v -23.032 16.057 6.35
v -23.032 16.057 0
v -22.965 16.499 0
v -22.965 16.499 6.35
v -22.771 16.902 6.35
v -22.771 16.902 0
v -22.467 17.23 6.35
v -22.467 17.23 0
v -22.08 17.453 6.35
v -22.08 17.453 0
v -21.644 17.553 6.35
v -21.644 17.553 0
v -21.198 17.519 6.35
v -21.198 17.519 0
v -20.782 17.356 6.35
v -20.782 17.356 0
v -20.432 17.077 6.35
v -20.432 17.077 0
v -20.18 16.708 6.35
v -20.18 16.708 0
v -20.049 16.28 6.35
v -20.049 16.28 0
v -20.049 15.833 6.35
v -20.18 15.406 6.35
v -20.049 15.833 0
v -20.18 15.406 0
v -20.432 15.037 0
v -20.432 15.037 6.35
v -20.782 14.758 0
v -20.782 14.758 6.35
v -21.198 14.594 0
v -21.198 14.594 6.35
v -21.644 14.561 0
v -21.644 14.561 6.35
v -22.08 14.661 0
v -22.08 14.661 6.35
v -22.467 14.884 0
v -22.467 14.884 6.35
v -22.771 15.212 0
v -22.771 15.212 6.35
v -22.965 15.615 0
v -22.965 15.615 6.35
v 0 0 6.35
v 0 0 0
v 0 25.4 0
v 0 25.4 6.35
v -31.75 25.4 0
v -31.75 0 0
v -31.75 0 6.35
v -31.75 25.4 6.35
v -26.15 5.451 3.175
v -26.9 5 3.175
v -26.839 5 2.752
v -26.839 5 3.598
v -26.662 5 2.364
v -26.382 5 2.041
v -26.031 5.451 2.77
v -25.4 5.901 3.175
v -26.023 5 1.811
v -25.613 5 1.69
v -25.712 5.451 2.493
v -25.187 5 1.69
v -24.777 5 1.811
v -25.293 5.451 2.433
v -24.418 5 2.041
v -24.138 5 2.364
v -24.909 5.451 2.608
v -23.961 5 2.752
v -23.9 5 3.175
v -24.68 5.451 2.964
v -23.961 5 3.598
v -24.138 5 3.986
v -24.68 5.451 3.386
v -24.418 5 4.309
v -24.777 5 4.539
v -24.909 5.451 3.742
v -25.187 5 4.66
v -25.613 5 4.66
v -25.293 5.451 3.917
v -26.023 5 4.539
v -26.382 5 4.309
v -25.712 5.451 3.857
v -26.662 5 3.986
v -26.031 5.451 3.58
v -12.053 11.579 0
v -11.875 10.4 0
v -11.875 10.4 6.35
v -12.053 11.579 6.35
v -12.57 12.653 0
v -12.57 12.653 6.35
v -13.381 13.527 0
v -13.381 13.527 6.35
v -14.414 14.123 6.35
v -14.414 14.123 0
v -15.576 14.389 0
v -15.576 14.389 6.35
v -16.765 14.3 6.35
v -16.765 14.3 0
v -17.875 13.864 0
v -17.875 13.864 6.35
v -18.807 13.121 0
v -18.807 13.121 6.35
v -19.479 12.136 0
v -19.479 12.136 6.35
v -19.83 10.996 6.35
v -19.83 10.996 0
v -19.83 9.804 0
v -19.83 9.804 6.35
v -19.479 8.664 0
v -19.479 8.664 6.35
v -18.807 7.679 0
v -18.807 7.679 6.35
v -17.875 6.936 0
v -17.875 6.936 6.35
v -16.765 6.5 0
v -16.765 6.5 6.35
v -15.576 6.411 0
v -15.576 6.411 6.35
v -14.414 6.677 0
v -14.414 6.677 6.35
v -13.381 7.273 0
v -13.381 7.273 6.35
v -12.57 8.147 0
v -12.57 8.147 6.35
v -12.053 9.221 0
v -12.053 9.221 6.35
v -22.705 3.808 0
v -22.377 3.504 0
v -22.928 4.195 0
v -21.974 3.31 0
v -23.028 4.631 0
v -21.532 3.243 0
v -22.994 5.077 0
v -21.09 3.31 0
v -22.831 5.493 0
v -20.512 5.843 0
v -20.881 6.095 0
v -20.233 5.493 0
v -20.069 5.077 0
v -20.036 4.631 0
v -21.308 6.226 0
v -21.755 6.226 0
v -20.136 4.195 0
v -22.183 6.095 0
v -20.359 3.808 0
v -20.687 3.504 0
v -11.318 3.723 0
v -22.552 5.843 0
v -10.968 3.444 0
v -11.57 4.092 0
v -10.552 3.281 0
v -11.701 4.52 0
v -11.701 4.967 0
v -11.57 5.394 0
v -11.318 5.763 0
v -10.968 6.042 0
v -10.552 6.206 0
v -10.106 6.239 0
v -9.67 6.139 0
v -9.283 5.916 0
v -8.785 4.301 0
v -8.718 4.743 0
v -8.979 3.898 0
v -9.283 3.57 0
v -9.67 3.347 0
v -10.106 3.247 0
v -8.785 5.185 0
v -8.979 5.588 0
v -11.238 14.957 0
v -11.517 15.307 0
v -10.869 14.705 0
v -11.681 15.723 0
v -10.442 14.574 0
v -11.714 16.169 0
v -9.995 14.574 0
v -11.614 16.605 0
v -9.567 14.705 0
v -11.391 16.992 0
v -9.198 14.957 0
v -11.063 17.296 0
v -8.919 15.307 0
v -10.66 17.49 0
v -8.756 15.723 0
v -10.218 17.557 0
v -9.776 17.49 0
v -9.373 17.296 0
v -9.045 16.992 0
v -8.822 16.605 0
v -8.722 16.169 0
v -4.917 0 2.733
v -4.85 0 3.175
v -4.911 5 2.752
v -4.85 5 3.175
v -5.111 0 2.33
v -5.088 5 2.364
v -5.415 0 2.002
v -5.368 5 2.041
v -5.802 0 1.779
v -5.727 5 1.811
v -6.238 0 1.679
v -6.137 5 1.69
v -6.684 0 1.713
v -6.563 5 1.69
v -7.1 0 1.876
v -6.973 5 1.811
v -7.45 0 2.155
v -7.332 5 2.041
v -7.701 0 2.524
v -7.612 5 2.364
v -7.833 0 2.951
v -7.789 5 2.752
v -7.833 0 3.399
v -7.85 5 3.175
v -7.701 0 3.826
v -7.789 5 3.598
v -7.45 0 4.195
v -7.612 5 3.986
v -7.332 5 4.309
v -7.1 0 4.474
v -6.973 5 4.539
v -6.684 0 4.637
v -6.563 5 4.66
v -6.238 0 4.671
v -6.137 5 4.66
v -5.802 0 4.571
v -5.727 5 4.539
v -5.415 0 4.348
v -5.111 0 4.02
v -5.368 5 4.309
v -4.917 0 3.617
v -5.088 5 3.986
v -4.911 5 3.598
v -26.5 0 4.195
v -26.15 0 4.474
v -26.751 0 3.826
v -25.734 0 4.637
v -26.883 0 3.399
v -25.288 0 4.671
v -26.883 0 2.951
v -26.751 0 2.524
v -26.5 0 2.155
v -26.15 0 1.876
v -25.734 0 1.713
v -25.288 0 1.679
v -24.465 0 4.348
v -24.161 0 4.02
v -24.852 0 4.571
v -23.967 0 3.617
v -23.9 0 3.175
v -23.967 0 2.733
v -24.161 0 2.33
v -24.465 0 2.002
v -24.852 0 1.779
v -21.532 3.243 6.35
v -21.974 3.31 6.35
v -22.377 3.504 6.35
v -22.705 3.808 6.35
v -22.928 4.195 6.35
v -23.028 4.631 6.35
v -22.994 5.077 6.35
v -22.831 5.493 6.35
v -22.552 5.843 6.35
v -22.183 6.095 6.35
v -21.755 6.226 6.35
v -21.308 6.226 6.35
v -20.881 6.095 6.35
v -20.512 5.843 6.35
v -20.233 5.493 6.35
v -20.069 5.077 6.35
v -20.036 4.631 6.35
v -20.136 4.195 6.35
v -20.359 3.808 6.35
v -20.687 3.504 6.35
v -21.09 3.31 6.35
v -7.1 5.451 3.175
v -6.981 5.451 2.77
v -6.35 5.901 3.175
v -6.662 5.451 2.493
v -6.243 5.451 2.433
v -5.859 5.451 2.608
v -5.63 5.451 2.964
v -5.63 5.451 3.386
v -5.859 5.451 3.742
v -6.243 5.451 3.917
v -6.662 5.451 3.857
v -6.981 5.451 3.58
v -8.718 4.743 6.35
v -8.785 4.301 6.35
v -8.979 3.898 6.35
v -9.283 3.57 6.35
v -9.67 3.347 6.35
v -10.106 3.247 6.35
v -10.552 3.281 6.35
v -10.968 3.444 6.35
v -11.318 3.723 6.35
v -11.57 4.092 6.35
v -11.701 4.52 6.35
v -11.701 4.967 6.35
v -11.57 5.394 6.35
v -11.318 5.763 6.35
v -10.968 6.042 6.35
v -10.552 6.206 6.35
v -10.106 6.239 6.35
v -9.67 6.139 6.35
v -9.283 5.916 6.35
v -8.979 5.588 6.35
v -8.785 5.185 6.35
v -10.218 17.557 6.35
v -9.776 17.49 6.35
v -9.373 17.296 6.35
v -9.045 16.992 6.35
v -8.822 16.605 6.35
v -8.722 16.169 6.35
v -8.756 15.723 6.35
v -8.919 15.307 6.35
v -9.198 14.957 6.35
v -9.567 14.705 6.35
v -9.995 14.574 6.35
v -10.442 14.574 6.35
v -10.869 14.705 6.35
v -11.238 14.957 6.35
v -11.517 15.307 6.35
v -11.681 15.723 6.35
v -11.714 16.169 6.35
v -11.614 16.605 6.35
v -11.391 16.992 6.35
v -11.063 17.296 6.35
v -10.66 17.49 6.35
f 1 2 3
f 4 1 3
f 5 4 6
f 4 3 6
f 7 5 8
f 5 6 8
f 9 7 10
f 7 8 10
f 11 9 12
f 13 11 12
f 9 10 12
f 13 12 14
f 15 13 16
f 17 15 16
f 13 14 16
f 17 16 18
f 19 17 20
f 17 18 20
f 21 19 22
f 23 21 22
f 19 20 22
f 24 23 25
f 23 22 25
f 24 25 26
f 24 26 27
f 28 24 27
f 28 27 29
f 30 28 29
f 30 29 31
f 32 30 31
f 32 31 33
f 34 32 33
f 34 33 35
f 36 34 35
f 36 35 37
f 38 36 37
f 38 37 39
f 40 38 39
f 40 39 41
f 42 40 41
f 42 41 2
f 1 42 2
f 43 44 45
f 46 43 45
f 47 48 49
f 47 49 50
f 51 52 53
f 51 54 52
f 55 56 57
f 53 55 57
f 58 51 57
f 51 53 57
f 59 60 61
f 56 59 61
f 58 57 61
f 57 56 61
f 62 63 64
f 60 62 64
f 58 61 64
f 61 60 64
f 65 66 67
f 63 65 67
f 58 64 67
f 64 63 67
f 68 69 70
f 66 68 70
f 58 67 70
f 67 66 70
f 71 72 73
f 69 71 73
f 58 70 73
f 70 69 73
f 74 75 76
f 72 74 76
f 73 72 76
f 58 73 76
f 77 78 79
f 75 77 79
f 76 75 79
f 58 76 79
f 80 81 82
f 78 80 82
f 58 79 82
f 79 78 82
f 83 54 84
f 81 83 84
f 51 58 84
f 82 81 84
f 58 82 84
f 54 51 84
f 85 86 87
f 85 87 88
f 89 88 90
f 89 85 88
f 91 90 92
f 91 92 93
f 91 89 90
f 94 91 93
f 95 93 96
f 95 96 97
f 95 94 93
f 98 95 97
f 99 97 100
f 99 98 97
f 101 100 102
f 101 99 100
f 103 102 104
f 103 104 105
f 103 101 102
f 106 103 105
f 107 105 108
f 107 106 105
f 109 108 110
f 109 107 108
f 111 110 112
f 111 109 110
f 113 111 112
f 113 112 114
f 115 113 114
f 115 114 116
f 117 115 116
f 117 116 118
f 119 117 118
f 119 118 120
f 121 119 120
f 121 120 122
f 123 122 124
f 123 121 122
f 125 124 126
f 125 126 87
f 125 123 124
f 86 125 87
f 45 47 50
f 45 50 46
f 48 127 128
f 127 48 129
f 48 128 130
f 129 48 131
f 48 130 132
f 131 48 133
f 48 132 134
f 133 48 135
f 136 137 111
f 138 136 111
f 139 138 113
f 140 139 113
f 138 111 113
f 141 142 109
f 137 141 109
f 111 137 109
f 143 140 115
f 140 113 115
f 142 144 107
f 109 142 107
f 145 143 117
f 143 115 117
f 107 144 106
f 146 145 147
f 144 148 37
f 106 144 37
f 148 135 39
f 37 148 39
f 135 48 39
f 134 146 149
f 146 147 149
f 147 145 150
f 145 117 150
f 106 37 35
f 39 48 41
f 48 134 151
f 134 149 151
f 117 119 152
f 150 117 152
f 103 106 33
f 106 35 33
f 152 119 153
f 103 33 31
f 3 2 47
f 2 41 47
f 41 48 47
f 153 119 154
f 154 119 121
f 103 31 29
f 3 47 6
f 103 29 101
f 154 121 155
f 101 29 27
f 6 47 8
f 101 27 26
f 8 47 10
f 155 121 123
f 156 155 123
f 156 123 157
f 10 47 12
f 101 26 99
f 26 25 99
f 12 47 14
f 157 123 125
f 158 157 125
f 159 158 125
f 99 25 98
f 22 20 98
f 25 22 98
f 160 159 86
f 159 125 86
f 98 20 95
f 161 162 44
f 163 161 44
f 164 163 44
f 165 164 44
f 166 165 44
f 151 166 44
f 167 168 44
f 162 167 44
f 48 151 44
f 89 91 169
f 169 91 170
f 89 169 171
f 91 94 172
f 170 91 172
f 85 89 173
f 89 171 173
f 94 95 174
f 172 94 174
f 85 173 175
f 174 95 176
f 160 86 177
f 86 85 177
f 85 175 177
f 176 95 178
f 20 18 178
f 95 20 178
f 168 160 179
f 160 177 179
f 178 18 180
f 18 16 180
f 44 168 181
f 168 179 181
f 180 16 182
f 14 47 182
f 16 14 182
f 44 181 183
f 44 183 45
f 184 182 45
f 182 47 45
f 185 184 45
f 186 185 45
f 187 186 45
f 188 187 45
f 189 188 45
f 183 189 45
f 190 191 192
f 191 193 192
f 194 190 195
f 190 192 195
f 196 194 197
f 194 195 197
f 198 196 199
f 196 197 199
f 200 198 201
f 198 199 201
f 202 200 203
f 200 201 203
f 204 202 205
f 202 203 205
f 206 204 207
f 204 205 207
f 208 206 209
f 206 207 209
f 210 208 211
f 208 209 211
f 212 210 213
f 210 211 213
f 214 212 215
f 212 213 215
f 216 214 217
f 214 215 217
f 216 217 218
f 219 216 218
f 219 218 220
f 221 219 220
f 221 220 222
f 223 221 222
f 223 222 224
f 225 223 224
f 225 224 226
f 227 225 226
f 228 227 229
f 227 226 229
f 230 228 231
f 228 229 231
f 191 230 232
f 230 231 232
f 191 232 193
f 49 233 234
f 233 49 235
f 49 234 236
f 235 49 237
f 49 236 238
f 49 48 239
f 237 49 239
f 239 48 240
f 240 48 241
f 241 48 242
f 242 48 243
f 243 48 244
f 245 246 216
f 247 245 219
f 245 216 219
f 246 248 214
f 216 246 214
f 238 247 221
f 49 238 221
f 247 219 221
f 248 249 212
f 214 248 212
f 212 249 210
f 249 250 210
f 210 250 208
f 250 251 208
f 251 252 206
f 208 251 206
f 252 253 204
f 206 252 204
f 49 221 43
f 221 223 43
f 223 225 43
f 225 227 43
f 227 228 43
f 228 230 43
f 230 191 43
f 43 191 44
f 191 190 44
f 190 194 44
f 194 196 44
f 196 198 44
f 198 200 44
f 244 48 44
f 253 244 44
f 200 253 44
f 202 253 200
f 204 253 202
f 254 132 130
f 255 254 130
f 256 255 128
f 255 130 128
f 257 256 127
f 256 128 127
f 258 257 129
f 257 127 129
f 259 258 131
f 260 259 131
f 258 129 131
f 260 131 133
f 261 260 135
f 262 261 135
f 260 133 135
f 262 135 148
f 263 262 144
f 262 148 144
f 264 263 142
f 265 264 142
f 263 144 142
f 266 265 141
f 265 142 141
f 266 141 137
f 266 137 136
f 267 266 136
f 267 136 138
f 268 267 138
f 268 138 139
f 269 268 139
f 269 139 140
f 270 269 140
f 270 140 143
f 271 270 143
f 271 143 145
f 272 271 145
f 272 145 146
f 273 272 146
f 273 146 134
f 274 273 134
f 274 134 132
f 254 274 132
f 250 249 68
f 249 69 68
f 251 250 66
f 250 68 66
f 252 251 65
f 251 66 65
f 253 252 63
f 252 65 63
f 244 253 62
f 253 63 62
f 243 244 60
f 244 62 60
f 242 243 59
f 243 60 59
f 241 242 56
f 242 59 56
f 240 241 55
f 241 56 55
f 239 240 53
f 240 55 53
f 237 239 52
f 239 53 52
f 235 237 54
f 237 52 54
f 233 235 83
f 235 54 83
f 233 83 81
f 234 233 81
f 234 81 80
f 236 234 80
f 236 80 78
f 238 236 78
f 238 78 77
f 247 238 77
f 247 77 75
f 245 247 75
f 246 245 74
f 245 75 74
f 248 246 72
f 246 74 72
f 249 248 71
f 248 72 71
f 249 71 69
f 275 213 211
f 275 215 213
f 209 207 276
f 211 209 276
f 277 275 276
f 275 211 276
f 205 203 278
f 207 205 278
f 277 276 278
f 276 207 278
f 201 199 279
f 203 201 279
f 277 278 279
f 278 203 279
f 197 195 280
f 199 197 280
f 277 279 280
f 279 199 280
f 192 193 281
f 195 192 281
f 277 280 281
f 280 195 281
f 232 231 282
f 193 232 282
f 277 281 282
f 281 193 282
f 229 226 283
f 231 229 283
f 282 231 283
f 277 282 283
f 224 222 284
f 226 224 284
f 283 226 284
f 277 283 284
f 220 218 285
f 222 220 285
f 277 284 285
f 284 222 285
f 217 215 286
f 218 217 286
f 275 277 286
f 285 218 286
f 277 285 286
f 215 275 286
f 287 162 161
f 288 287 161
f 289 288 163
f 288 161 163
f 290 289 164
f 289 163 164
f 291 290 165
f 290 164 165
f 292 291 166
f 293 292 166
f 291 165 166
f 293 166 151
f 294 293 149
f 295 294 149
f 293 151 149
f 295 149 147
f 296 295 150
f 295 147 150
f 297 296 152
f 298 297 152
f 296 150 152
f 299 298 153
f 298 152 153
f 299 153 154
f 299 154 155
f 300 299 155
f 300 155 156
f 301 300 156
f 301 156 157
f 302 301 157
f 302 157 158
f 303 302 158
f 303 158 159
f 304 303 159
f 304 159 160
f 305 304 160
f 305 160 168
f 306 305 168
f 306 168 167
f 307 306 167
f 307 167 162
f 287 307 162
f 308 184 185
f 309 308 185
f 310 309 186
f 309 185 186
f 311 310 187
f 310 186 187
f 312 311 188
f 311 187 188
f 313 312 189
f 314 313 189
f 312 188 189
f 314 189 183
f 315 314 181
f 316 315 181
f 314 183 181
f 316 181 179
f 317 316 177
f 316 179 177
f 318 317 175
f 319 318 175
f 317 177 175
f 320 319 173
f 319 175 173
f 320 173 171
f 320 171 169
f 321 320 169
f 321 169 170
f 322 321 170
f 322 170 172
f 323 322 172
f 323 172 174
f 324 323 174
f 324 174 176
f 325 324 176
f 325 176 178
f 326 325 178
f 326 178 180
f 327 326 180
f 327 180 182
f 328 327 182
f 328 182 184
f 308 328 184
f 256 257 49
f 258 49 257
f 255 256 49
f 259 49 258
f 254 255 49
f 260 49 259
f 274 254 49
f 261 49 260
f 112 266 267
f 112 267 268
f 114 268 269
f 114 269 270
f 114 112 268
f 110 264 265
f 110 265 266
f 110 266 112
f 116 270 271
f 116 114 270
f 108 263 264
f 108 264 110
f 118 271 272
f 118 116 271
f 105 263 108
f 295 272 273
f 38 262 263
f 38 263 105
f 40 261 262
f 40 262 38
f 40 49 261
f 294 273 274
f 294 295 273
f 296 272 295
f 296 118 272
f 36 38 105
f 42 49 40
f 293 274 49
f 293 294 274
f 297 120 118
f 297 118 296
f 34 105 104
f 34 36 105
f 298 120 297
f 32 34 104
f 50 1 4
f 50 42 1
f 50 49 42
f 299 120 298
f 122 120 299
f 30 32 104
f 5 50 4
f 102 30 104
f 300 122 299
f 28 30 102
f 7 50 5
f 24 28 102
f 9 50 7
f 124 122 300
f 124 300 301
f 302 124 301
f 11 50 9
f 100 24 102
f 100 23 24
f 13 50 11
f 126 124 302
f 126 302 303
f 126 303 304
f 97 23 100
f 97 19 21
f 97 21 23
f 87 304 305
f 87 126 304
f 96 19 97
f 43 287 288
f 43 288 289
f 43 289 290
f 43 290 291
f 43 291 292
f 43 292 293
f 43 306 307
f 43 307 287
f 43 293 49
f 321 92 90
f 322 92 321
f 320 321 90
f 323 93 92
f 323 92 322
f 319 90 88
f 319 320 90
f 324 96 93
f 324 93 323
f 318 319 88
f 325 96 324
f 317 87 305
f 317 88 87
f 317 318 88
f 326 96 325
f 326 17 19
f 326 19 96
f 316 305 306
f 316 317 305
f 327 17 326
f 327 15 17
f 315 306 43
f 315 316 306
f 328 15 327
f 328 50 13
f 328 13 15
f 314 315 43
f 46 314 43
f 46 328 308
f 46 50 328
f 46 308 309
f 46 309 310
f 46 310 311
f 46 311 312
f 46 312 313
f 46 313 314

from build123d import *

# Parameters (mm, degrees)
FRONT_PROFILE_W           = 31.75
FRONT_PROFILE_H           = 25.4
FRONT_PROFILE_R           = 4
WEPON_MOTOR_MOINT_DEPTH   = 6.35
F_3_0MM_DOWEL_HOLE1_D     = 3
CIRPATTERN1_COUNT         = 4
F_3_0MM_DOWEL_HOLE2_D     = 3
F_3_0MM_DOWEL_HOLE2_DEPTH = 5
F_3_0MM_DOWEL_HOLE2_TIP   = 0.901290929


with BuildPart() as part:
    # front profile → wepon motor moint (new body)
    with BuildSketch(Plane.XY):
        with Locations((-15.875, 12.7)):
            Rectangle(FRONT_PROFILE_W, FRONT_PROFILE_H)
        with Locations((-15.875, 10.4)):
            Circle(FRONT_PROFILE_R, mode=Mode.SUBTRACT)
    extrude(amount=WEPON_MOTOR_MOINT_DEPTH)

    # Ø3.0mm Dowel Hole1 (through all)
    with Locations(Plane.XY.offset(6.35)):
        with Locations((-21.531854249, 16.056854249)):
            f_3_0mm_dowel_hole1 = Hole(F_3_0MM_DOWEL_HOLE1_D / 2)

    # CirPattern1: Ø3.0mm Dowel Hole1 ×4 about axis
    cirpattern1_axis = Axis((-15.875, 10.4, 0), (0, 0, 1))
    for i in range(1, CIRPATTERN1_COUNT):
        add(f_3_0mm_dowel_hole1.rotate(cirpattern1_axis, i * 360 / CIRPATTERN1_COUNT), mode=Mode.SUBTRACT)

    # Ø3.0mm Dowel Hole2
    with Locations(Plane(origin=(0, 0, 0), x_dir=(-1, 0, 0), z_dir=(0, -1, 0))):
        with Locations((6.35, -3.175), (25.4, -3.175)):
            Hole(F_3_0MM_DOWEL_HOLE2_D / 2, depth=F_3_0MM_DOWEL_HOLE2_DEPTH)
            with Locations((0, 0, -(F_3_0MM_DOWEL_HOLE2_DEPTH + F_3_0MM_DOWEL_HOLE2_TIP / 2))):  # 118° drill point
                Cone(0, F_3_0MM_DOWEL_HOLE2_D / 2, F_3_0MM_DOWEL_HOLE2_TIP, mode=Mode.SUBTRACT)


solid = part.part
